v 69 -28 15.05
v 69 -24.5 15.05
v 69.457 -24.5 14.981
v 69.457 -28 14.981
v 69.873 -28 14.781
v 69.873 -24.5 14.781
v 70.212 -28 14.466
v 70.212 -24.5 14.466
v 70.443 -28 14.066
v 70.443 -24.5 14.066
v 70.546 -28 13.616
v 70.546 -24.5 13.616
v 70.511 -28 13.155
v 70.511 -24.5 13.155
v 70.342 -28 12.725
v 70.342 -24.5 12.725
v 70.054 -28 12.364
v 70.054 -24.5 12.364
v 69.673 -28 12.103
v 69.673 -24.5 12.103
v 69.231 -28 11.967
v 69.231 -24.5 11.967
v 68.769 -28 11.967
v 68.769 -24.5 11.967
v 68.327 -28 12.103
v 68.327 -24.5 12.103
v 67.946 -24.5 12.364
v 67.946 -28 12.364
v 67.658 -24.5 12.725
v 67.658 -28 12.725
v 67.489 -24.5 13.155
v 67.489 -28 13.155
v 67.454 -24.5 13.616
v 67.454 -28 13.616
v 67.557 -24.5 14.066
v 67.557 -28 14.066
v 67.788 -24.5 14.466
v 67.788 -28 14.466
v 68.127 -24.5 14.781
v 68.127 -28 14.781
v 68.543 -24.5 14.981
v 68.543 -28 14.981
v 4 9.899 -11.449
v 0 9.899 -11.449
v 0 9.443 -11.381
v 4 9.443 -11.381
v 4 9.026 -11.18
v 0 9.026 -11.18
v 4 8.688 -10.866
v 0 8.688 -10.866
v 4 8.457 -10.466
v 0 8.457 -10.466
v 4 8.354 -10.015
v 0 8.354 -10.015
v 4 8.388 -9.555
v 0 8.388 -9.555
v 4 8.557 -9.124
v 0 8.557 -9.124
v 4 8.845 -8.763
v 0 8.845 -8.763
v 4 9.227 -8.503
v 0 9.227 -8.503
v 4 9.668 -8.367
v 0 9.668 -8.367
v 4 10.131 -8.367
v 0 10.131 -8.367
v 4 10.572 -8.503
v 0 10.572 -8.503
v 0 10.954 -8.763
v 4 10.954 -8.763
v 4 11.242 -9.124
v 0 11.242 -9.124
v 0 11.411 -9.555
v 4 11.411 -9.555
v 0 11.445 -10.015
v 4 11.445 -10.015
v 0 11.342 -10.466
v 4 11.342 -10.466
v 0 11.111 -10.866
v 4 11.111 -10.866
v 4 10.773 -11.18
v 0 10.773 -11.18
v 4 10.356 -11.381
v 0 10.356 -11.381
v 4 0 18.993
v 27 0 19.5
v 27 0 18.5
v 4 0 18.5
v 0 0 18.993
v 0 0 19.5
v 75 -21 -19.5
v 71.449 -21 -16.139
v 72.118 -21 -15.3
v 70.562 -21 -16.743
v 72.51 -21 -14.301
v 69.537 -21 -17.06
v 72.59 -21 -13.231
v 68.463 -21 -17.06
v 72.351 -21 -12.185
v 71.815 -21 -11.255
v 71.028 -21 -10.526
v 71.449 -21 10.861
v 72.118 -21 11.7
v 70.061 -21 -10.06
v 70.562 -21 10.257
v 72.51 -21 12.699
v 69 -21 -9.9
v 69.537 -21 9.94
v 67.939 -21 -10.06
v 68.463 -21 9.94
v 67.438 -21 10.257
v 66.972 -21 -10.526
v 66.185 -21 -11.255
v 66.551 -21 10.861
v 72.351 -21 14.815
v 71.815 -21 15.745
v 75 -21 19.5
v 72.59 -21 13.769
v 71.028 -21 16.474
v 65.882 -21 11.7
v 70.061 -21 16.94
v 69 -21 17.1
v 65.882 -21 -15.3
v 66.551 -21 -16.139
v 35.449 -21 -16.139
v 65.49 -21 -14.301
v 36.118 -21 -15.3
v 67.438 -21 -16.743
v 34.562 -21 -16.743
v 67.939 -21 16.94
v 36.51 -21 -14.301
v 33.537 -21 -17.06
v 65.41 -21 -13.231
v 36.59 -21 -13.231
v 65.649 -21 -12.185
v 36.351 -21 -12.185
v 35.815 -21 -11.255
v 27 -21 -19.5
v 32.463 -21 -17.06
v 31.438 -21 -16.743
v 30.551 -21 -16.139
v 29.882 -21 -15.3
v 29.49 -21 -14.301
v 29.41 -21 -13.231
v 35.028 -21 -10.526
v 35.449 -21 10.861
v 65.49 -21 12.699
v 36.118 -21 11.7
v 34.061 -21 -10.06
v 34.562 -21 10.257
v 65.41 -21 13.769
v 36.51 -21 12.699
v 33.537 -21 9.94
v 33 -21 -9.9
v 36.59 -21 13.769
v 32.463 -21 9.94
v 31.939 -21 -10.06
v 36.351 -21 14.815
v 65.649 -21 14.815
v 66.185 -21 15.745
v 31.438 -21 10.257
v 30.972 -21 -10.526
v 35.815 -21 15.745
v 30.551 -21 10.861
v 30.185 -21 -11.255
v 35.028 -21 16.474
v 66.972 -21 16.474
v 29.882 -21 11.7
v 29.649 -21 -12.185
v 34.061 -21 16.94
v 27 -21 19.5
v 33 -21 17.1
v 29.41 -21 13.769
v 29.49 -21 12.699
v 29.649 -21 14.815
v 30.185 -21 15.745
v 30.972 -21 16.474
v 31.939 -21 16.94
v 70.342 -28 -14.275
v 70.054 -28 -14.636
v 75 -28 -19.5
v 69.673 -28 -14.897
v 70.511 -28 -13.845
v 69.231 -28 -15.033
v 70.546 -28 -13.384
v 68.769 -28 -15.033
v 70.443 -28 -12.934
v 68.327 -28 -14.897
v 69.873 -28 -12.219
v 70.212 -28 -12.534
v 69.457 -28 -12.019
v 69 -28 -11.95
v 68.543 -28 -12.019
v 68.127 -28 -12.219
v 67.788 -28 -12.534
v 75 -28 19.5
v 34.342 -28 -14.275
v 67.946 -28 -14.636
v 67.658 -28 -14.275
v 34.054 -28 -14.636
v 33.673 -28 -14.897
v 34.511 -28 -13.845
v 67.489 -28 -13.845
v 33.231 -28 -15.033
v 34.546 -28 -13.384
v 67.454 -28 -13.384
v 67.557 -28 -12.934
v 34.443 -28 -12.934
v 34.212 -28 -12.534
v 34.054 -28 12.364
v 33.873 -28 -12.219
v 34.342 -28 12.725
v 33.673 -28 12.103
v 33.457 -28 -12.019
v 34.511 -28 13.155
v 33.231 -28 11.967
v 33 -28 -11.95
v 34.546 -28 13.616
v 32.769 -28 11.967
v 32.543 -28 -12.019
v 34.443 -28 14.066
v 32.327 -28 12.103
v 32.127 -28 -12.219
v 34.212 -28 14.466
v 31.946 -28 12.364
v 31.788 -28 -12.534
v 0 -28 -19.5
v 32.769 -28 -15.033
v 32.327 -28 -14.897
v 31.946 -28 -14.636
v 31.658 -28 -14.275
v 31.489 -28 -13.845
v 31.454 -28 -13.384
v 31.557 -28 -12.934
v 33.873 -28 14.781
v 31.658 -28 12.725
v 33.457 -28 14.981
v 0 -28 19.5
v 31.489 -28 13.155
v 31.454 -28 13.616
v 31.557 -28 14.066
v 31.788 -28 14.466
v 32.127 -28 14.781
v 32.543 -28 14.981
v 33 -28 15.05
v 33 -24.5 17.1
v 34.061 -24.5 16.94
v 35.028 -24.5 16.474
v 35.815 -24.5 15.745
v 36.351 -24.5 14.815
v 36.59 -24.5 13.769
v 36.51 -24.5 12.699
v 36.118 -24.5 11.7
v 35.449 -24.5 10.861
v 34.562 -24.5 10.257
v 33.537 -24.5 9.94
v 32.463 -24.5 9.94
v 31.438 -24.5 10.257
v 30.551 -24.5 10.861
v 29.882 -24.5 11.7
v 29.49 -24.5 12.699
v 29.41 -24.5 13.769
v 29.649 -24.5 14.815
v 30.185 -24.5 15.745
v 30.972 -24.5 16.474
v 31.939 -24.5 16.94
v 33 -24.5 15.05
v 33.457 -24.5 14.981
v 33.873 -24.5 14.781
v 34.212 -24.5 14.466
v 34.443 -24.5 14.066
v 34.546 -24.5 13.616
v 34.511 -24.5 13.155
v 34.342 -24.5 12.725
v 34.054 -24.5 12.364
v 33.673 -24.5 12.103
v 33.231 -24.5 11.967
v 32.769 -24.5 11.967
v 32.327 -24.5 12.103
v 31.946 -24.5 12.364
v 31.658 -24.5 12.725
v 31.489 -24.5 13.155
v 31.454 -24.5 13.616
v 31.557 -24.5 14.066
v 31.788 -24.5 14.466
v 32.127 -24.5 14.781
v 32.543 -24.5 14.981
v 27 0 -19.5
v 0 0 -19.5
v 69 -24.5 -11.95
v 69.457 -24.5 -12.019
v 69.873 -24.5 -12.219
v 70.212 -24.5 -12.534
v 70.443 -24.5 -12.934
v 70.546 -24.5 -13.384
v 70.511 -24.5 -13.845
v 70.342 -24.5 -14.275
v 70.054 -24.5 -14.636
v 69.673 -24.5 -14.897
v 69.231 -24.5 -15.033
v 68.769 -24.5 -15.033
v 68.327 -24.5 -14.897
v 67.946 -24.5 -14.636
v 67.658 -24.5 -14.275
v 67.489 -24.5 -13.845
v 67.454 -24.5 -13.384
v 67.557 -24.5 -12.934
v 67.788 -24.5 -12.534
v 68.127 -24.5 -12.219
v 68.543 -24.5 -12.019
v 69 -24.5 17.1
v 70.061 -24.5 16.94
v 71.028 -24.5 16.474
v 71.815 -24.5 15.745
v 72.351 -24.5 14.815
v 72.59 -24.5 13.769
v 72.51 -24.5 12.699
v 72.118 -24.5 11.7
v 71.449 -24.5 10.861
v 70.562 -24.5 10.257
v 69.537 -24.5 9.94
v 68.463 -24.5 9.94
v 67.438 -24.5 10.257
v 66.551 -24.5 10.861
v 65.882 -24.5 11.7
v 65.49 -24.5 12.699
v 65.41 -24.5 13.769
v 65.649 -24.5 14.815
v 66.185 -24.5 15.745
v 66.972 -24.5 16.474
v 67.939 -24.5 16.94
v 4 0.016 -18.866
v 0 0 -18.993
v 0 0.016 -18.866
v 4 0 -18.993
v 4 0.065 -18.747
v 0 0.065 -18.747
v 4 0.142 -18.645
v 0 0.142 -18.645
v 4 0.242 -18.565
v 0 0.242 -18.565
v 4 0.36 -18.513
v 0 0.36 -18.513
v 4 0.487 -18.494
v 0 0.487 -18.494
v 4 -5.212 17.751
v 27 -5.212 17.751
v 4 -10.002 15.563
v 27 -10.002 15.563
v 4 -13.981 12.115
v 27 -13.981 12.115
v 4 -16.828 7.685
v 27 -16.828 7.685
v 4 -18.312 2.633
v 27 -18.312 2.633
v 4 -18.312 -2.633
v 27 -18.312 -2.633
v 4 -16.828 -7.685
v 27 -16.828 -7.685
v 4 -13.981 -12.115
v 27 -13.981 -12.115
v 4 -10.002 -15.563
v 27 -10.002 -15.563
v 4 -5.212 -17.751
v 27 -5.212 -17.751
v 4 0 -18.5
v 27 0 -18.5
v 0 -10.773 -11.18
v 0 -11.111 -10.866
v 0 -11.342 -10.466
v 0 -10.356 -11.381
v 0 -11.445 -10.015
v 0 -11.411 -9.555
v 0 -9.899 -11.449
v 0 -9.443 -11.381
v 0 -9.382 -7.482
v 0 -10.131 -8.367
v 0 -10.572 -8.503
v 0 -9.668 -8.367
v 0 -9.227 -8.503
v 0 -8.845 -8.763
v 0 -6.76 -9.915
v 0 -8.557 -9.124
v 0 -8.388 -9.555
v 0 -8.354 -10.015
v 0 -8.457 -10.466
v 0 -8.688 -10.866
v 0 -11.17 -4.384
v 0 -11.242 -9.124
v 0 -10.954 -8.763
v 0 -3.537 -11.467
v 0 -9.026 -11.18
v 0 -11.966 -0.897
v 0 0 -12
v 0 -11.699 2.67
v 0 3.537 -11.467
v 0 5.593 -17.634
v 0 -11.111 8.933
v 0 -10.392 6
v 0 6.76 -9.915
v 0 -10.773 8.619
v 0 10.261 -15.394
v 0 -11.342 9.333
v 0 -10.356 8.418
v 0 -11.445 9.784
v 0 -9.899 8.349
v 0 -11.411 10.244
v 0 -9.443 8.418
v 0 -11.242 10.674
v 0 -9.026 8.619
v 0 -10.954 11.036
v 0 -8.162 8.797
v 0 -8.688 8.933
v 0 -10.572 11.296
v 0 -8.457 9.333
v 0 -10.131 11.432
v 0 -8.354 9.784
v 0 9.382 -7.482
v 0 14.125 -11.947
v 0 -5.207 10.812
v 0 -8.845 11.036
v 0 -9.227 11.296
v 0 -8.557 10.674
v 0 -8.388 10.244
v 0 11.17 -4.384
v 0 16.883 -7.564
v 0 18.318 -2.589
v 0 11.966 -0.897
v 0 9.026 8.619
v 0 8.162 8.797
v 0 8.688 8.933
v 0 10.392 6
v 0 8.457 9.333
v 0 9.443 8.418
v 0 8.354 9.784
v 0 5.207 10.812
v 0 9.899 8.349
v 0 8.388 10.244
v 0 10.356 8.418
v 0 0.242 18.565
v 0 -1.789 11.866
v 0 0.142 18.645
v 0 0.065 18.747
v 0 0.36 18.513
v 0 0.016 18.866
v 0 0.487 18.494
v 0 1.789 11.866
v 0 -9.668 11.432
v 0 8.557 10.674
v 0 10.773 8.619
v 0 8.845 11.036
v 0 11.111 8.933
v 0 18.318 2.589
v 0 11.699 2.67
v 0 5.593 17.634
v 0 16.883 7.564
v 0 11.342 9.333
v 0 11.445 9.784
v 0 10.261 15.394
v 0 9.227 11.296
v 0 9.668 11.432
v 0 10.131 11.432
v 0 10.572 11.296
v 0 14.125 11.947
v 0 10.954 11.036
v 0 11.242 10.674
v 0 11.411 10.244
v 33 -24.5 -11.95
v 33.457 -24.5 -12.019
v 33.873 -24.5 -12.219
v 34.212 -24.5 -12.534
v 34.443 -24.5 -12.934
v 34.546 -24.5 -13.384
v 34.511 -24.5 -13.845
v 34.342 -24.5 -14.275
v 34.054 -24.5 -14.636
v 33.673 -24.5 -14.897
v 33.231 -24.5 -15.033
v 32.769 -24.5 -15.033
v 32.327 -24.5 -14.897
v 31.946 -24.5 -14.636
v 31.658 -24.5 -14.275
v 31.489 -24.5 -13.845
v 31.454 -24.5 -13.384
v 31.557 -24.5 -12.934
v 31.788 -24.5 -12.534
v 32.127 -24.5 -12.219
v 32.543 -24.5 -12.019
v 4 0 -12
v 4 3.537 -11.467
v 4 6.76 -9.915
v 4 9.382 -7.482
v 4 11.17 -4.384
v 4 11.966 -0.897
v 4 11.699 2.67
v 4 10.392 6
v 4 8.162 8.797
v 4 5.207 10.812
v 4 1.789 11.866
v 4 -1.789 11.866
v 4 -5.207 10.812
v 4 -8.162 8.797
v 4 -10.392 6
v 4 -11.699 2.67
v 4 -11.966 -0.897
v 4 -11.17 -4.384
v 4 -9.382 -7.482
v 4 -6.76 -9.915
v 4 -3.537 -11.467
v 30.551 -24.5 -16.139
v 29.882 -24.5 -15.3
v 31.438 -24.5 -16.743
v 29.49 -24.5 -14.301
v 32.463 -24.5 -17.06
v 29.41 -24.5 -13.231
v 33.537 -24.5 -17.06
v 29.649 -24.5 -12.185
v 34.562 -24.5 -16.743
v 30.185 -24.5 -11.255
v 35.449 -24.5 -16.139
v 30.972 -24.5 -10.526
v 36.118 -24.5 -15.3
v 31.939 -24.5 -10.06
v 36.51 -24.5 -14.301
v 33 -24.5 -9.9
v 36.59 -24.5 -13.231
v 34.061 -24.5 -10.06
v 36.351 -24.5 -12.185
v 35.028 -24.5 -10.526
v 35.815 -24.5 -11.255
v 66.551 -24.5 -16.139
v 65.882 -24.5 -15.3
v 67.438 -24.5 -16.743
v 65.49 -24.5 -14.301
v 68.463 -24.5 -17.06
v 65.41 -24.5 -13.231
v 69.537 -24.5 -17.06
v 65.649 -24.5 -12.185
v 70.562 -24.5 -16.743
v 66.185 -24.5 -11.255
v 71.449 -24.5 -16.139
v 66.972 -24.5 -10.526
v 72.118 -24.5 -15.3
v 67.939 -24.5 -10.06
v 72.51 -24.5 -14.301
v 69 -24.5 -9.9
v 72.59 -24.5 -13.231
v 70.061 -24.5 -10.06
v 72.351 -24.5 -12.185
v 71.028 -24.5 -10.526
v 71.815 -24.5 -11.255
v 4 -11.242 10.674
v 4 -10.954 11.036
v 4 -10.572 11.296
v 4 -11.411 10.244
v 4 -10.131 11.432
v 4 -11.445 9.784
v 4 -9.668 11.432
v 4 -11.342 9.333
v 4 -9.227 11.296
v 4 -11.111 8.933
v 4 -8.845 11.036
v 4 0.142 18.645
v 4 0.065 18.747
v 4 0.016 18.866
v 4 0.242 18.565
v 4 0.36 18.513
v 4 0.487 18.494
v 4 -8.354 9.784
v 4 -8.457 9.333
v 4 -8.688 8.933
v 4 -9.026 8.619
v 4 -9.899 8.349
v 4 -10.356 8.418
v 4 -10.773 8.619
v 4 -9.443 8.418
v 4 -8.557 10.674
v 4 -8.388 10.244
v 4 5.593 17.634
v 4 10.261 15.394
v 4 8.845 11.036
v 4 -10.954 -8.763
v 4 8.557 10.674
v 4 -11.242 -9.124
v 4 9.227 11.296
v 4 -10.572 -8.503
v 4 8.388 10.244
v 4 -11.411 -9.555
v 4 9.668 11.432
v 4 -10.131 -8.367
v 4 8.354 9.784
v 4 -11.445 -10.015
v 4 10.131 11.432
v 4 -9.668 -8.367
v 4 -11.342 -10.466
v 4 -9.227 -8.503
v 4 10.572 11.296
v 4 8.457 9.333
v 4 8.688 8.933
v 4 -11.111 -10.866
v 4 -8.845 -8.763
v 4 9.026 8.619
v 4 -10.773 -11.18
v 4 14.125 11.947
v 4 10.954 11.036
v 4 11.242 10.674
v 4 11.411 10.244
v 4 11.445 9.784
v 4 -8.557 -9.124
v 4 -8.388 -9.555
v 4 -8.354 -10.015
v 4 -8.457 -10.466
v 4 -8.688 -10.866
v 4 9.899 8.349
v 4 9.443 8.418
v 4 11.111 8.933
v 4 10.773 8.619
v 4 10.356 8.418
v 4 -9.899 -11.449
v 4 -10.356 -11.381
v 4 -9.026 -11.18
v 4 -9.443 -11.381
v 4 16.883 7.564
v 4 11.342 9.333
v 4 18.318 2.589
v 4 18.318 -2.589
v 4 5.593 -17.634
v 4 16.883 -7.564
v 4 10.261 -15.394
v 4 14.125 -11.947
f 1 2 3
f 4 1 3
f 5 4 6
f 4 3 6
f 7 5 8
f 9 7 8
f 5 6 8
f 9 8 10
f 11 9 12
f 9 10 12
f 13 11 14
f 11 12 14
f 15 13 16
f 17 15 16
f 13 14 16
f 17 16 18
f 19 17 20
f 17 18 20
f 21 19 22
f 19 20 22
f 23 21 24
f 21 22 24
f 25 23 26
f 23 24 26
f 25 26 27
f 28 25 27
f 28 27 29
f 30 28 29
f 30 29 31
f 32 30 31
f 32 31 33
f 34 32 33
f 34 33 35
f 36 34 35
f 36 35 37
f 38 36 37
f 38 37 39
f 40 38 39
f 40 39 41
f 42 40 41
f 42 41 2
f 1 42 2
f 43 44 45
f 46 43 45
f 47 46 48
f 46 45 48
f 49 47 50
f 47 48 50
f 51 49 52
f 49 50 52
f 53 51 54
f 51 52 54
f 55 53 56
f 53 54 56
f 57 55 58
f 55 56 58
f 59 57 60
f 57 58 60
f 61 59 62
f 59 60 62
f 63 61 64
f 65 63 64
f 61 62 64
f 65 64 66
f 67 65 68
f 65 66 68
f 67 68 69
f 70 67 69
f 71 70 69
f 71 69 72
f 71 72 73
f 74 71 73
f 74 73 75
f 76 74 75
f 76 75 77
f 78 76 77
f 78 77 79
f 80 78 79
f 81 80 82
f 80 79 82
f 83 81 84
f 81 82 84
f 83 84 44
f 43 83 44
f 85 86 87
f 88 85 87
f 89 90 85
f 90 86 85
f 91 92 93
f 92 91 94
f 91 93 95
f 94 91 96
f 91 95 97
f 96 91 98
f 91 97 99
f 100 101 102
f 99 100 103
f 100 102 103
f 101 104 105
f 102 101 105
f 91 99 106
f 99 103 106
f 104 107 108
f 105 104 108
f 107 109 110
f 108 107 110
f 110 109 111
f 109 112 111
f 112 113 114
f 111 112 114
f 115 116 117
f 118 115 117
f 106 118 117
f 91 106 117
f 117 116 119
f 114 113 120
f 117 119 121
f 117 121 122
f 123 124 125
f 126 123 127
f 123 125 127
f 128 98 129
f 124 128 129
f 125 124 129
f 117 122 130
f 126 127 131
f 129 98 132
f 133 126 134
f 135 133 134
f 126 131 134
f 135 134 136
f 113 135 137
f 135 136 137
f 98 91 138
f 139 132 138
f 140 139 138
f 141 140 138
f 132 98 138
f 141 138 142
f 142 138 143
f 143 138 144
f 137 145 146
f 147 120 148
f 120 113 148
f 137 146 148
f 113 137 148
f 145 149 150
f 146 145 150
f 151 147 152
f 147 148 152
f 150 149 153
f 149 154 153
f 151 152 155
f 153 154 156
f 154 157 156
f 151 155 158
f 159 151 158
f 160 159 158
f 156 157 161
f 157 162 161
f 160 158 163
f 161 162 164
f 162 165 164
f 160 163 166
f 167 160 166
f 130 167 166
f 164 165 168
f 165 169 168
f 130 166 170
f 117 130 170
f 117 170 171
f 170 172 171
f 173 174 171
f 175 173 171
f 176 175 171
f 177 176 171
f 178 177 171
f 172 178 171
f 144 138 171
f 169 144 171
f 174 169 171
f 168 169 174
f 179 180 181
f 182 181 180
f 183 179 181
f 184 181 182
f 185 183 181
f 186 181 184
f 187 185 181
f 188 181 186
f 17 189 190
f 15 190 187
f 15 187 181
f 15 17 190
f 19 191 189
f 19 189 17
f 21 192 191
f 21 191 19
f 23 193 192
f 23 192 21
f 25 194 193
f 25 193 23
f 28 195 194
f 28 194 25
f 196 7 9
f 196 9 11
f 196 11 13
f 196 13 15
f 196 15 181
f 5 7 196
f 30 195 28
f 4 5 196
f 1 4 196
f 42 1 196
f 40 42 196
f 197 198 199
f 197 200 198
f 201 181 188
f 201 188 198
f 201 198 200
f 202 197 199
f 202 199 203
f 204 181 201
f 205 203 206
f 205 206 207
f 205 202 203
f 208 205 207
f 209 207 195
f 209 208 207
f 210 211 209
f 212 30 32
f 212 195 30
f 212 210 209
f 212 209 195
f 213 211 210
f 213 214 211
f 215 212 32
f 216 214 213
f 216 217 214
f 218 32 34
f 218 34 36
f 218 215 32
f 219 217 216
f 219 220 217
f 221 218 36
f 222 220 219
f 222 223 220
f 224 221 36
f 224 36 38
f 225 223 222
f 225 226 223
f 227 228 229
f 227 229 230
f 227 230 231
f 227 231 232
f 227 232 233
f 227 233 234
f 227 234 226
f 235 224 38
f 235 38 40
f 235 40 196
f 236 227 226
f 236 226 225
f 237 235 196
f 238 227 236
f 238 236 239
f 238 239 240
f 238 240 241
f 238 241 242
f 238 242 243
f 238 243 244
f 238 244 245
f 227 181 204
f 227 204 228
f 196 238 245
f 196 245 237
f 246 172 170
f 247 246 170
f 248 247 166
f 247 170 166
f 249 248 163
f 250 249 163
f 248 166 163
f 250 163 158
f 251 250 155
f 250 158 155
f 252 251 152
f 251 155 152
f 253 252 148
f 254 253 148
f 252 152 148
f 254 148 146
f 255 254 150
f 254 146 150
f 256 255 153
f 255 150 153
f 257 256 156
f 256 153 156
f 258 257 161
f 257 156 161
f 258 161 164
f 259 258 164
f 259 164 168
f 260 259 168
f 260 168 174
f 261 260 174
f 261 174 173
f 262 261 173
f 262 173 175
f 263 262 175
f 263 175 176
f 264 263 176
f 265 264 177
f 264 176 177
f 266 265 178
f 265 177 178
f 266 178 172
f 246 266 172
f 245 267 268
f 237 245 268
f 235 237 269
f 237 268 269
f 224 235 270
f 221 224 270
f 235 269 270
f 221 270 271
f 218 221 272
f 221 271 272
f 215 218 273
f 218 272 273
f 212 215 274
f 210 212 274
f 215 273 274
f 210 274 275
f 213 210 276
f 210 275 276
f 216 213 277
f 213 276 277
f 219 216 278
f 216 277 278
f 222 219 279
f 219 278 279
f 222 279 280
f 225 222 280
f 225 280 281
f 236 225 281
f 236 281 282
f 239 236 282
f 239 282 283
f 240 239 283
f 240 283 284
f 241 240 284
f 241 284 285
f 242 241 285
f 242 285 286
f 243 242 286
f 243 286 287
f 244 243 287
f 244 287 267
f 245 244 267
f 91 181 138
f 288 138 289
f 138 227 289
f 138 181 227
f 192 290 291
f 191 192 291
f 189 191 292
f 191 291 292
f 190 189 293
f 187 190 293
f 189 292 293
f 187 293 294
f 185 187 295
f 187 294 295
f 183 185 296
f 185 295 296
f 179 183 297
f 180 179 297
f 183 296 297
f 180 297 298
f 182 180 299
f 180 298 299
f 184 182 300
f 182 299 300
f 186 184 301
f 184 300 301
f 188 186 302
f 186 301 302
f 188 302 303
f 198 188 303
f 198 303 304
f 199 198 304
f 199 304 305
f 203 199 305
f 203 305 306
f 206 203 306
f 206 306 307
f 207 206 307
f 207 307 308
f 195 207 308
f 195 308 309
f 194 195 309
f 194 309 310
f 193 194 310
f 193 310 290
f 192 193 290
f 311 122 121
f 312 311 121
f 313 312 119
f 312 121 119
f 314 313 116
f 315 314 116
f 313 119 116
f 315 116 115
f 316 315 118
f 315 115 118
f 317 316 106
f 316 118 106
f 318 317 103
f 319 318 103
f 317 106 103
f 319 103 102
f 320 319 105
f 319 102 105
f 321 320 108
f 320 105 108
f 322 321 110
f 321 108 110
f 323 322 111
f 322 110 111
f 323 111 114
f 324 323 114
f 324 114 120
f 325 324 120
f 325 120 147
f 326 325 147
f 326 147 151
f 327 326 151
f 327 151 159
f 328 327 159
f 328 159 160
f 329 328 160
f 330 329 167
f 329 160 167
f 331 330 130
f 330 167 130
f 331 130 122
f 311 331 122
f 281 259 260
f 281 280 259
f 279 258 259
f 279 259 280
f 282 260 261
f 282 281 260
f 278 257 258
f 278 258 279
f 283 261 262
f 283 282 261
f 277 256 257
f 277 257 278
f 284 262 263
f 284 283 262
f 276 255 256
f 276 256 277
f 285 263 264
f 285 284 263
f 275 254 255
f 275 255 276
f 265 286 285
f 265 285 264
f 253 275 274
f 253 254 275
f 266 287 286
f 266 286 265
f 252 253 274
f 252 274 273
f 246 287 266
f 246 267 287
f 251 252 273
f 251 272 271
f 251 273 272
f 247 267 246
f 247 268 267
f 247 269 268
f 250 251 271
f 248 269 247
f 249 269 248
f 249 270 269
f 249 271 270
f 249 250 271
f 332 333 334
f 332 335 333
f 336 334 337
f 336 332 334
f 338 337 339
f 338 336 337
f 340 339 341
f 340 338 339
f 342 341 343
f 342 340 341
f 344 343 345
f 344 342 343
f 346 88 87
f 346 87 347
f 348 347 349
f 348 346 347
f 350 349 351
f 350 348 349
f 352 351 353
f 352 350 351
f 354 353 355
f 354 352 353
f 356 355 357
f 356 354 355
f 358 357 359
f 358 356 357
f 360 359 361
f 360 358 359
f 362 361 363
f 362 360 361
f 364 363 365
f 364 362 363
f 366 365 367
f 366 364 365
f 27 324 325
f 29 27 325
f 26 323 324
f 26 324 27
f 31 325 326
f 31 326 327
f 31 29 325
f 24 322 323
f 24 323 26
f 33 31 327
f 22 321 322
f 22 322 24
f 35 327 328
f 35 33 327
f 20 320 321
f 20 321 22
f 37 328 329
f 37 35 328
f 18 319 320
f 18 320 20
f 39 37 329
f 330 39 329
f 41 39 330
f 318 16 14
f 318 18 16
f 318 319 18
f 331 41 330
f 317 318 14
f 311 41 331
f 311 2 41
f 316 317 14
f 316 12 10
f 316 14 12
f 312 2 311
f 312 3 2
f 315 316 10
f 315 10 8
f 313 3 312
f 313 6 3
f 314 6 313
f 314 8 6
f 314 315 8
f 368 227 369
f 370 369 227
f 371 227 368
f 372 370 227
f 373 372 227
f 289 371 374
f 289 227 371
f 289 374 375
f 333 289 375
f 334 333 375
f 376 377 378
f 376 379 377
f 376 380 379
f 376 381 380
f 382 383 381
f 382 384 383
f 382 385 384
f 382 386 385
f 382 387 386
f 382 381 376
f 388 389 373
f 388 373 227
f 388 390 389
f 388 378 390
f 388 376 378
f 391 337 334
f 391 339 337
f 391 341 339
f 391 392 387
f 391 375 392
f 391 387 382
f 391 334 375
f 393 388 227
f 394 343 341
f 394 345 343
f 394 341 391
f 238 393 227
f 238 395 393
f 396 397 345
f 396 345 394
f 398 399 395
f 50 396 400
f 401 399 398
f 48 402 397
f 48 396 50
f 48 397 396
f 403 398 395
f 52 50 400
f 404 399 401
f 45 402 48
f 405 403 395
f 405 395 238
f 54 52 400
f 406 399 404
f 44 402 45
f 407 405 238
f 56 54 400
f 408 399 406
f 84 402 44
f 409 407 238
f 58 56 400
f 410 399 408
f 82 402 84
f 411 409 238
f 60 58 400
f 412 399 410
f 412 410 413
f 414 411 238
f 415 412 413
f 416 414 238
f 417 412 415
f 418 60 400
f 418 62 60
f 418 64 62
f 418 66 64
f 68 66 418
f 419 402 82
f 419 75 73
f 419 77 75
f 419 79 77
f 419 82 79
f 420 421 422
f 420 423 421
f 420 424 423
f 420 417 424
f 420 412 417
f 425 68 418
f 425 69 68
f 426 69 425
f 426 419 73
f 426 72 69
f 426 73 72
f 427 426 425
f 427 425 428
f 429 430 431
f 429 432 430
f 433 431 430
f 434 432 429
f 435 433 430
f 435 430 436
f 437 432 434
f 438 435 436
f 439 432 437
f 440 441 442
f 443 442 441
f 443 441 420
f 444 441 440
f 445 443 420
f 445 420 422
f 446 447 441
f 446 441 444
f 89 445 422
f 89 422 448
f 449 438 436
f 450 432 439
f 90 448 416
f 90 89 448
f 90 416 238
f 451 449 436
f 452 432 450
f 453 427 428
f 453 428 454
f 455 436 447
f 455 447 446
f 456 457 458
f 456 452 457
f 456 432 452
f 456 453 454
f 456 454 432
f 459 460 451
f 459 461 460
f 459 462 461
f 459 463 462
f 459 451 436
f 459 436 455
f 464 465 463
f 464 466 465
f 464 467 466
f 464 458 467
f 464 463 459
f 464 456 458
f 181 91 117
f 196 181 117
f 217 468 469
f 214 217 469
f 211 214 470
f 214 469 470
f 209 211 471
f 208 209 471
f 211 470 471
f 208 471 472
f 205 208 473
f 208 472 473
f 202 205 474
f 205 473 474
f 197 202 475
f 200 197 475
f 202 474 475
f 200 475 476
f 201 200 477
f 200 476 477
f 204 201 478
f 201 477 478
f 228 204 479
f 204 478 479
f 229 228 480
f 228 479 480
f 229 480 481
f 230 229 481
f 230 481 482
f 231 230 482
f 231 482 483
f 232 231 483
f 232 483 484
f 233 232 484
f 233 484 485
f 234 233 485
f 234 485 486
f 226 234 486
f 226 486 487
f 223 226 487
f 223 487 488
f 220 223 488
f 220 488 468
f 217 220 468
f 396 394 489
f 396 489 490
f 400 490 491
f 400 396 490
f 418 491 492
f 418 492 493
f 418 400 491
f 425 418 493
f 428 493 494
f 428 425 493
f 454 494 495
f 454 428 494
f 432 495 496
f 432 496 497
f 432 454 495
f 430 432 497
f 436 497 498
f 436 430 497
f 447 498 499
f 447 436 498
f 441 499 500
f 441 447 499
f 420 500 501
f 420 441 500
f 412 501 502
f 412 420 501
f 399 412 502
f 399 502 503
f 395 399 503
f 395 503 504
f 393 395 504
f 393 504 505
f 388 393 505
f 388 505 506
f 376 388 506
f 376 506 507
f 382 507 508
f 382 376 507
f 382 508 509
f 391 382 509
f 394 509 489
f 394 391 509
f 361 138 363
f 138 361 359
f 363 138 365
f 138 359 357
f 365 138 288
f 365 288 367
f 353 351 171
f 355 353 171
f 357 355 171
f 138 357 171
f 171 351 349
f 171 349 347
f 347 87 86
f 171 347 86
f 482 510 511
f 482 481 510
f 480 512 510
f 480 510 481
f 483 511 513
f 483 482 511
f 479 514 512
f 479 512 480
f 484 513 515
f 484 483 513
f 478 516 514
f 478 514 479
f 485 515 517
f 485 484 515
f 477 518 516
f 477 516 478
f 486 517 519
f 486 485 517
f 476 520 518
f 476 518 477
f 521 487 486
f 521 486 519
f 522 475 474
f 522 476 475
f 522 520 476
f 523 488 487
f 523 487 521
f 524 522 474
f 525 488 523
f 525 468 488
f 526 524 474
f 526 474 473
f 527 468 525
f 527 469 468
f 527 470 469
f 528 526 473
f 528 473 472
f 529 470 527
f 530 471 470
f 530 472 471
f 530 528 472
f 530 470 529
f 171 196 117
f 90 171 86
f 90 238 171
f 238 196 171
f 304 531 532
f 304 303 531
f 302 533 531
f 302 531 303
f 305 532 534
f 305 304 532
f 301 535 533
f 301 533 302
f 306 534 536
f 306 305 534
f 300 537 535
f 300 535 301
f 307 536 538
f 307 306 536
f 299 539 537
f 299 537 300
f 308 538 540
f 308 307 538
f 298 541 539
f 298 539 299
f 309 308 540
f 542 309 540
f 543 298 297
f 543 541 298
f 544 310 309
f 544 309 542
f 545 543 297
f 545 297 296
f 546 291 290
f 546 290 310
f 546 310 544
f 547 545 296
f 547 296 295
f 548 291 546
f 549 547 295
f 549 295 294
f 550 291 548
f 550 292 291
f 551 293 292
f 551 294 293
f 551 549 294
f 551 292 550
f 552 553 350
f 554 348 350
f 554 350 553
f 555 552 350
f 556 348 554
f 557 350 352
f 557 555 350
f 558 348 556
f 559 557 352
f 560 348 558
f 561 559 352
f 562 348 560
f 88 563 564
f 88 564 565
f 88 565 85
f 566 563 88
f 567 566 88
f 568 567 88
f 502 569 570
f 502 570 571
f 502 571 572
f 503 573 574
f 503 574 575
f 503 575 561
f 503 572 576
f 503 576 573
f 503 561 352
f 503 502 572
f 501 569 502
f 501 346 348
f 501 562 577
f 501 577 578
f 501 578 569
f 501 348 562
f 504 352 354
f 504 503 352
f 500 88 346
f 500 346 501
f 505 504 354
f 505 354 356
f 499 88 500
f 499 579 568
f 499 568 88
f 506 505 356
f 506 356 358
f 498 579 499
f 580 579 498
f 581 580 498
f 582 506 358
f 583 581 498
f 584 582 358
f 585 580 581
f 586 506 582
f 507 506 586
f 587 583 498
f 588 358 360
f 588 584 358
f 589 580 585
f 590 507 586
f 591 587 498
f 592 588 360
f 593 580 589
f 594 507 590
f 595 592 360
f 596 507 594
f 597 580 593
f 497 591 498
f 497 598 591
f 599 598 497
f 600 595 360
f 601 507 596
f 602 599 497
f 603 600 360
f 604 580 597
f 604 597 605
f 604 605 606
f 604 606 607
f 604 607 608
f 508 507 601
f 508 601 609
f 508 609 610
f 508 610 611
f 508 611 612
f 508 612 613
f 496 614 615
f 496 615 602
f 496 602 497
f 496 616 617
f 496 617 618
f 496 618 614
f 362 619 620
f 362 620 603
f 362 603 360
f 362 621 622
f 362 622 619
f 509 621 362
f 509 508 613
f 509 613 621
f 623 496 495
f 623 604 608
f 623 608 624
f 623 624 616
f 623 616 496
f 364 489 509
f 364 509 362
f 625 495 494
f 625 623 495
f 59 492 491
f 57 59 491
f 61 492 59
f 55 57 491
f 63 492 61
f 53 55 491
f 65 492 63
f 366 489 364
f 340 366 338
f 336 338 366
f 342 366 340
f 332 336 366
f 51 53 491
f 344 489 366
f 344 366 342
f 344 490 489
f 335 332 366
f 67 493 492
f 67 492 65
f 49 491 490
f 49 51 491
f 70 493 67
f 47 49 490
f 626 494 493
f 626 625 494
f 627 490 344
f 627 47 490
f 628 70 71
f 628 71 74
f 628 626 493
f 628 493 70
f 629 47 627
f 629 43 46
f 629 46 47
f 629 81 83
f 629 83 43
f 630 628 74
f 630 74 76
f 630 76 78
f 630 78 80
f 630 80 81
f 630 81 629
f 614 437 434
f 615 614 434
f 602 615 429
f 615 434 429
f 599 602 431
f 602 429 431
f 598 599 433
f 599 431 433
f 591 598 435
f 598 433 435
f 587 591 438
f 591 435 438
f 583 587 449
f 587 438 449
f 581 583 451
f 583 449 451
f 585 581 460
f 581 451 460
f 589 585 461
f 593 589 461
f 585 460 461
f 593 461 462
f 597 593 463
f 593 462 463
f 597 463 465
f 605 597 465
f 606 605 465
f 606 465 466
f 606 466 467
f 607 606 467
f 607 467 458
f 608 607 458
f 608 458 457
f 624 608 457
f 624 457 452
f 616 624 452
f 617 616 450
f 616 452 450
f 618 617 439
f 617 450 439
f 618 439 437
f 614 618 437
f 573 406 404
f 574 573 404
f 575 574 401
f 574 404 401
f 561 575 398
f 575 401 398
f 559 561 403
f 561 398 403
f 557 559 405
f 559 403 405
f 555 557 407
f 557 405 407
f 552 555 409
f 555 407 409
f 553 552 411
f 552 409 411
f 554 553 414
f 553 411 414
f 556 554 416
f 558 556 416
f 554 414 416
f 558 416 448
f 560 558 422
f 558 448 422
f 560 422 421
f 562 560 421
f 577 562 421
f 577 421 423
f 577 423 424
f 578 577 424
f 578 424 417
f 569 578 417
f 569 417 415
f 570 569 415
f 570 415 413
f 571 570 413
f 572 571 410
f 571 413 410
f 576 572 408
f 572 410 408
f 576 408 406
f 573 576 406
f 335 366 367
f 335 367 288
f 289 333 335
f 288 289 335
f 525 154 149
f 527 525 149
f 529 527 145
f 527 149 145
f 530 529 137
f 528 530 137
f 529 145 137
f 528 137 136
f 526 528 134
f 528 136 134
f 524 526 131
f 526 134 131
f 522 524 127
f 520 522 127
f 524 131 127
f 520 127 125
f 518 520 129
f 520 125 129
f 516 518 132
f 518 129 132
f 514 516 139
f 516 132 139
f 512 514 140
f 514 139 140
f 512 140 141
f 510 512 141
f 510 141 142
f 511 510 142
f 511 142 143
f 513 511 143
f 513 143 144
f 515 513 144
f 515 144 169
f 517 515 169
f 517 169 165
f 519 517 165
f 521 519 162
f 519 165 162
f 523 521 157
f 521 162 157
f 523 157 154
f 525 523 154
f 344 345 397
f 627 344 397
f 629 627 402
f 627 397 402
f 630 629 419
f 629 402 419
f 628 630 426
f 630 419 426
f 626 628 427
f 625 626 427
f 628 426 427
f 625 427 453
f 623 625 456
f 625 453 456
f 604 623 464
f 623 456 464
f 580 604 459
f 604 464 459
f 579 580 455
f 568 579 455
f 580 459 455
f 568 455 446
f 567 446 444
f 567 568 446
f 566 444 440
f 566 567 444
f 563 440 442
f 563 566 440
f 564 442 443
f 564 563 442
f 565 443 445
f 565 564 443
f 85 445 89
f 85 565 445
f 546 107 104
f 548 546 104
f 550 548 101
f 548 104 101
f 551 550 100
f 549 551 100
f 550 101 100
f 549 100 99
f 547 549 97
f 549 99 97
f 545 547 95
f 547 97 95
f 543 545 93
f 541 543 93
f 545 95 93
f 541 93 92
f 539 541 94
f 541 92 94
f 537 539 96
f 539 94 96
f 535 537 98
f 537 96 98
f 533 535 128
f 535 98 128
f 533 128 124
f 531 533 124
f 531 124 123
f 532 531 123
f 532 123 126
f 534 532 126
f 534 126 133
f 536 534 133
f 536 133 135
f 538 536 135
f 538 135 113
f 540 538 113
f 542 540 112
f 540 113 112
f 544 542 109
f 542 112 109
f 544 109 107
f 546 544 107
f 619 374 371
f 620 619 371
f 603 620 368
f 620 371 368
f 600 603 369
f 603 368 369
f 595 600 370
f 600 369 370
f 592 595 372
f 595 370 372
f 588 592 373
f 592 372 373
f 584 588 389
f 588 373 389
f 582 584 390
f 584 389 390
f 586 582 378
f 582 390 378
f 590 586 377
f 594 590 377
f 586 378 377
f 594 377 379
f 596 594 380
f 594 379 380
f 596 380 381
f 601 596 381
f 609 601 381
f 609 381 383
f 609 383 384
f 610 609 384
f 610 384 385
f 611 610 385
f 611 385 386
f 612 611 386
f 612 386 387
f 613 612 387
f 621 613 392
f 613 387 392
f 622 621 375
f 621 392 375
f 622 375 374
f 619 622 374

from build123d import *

# Parameters (mm, degrees)
ESBO_O1_R                = 18.5
ESBO_O1_R_2              = 12
RESSALTO_EXTRUS_O1_DEPTH = 4
RESSALTO_EXTRUS_O2_DEPTH = 27
FILETE1_R                = 0.5
ESBO_O3_W                = 39
ESBO_O3_H                = 7
RESSALTO_EXTRUS_O3_DEPTH = 75
ESBO_O4_R                = 1.55
CORTE_EXTRUS_O1_DEPTH    = 7
ESBO_O5_R                = 3.6
CORTE_EXTRUS_O2_DEPTH    = 3.5
ESBO_O6_R                = 1.55
CORTE_EXTRUS_O4_DEPTH    = 4


with BuildPart() as part:
    # Esboço1 → Ressalto-extrusão1 (new body)
    with BuildSketch(Plane(origin=(0, 0, 0), x_dir=(0, 0, -1), z_dir=(1, 0, 0))):
        Circle(ESBO_O1_R)
        Circle(ESBO_O1_R_2, mode=Mode.SUBTRACT)
    extrude(amount=RESSALTO_EXTRUS_O1_DEPTH)

    # Esboço2 → Ressalto-extrusão2 (add)
    with BuildSketch(Plane.ZY):
        with BuildLine():
            Line((-19.5, 0), (-19.5, -21))
            Line((-19.5, -21), (19.5, -21))
            Line((19.5, -21), (19.5, 0))
            Line((19.5, 0), (18.5, 0))
            ThreePointArc((18.5, 0), (0, -18.5), (-18.5, 0))
            Line((-18.5, 0), (-19.5, 0))
        make_face()
    extrude(amount=-RESSALTO_EXTRUS_O2_DEPTH)

    # Filete1
    filete1_edges = [part.edges().sort_by_distance(p)[0] for p in [
        (2, 0, 18.5),
        (2, 0, -18.5),
    ]]
    fillet(filete1_edges, radius=FILETE1_R)

    # Esboço3 → Ressalto-extrusão3 (add)
    with BuildSketch(Plane.ZY):
        with Locations((0, -24.5)):
            Rectangle(ESBO_O3_W, ESBO_O3_H)
    extrude(amount=-RESSALTO_EXTRUS_O3_DEPTH)

    # Esboço4 → Corte-extrusão1 (cut)
    with BuildSketch(Plane(origin=(0, -21, 0), x_dir=(1, 0, 0), z_dir=(0, 1, 0))):
        with Locations(Location((33, 13.5, 0), (0, 0, 270))):
            Circle(ESBO_O4_R)
        with Locations(Location((69, 13.5, 0), (0, 0, 270))):
            Circle(ESBO_O4_R)
        with Locations(Location((33, -13.5, 0), (0, 0, 270))):
            Circle(ESBO_O4_R)
        with Locations(Location((69, -13.5, 0), (0, 0, 270))):
            Circle(ESBO_O4_R)
    extrude(amount=-CORTE_EXTRUS_O1_DEPTH, mode=Mode.SUBTRACT)

    # Esboço5 → Corte-extrusão2 (cut)
    with BuildSketch(Plane(origin=(0, -21, 0), x_dir=(1, 0, 0), z_dir=(0, 1, 0))):
        with Locations(Location((33, 13.5, 0), (0, 0, 270))):
            Circle(ESBO_O5_R)
        with Locations(Location((69, 13.5, 0), (0, 0, 270))):
            Circle(ESBO_O5_R)
        with Locations(Location((69, -13.5, 0), (0, 0, 270))):
            Circle(ESBO_O5_R)
        with Locations(Location((33, -13.5, 0), (0, 0, 270))):
            Circle(ESBO_O5_R)
    extrude(amount=-CORTE_EXTRUS_O2_DEPTH, mode=Mode.SUBTRACT)

    # Esboço6 → Corte-extrusão4 (cut)
    with BuildSketch(Plane.ZY):
        with Locations(Location((9.899494937, 9.899494937, 0), (0, 0, 180))):
            Circle(ESBO_O6_R)
        with Locations(Location((9.899494937, -9.899494937, 0), (0, 0, 180))):
            Circle(ESBO_O6_R)
        with Locations(Location((-9.899494937, -9.899494937, 0), (0, 0, 180))):
            Circle(ESBO_O6_R)
        with Locations(Location((-9.899494937, 9.899494937, 0), (0, 0, 180))):
            Circle(ESBO_O6_R)
    extrude(amount=-CORTE_EXTRUS_O4_DEPTH, mode=Mode.SUBTRACT)


solid = part.part
